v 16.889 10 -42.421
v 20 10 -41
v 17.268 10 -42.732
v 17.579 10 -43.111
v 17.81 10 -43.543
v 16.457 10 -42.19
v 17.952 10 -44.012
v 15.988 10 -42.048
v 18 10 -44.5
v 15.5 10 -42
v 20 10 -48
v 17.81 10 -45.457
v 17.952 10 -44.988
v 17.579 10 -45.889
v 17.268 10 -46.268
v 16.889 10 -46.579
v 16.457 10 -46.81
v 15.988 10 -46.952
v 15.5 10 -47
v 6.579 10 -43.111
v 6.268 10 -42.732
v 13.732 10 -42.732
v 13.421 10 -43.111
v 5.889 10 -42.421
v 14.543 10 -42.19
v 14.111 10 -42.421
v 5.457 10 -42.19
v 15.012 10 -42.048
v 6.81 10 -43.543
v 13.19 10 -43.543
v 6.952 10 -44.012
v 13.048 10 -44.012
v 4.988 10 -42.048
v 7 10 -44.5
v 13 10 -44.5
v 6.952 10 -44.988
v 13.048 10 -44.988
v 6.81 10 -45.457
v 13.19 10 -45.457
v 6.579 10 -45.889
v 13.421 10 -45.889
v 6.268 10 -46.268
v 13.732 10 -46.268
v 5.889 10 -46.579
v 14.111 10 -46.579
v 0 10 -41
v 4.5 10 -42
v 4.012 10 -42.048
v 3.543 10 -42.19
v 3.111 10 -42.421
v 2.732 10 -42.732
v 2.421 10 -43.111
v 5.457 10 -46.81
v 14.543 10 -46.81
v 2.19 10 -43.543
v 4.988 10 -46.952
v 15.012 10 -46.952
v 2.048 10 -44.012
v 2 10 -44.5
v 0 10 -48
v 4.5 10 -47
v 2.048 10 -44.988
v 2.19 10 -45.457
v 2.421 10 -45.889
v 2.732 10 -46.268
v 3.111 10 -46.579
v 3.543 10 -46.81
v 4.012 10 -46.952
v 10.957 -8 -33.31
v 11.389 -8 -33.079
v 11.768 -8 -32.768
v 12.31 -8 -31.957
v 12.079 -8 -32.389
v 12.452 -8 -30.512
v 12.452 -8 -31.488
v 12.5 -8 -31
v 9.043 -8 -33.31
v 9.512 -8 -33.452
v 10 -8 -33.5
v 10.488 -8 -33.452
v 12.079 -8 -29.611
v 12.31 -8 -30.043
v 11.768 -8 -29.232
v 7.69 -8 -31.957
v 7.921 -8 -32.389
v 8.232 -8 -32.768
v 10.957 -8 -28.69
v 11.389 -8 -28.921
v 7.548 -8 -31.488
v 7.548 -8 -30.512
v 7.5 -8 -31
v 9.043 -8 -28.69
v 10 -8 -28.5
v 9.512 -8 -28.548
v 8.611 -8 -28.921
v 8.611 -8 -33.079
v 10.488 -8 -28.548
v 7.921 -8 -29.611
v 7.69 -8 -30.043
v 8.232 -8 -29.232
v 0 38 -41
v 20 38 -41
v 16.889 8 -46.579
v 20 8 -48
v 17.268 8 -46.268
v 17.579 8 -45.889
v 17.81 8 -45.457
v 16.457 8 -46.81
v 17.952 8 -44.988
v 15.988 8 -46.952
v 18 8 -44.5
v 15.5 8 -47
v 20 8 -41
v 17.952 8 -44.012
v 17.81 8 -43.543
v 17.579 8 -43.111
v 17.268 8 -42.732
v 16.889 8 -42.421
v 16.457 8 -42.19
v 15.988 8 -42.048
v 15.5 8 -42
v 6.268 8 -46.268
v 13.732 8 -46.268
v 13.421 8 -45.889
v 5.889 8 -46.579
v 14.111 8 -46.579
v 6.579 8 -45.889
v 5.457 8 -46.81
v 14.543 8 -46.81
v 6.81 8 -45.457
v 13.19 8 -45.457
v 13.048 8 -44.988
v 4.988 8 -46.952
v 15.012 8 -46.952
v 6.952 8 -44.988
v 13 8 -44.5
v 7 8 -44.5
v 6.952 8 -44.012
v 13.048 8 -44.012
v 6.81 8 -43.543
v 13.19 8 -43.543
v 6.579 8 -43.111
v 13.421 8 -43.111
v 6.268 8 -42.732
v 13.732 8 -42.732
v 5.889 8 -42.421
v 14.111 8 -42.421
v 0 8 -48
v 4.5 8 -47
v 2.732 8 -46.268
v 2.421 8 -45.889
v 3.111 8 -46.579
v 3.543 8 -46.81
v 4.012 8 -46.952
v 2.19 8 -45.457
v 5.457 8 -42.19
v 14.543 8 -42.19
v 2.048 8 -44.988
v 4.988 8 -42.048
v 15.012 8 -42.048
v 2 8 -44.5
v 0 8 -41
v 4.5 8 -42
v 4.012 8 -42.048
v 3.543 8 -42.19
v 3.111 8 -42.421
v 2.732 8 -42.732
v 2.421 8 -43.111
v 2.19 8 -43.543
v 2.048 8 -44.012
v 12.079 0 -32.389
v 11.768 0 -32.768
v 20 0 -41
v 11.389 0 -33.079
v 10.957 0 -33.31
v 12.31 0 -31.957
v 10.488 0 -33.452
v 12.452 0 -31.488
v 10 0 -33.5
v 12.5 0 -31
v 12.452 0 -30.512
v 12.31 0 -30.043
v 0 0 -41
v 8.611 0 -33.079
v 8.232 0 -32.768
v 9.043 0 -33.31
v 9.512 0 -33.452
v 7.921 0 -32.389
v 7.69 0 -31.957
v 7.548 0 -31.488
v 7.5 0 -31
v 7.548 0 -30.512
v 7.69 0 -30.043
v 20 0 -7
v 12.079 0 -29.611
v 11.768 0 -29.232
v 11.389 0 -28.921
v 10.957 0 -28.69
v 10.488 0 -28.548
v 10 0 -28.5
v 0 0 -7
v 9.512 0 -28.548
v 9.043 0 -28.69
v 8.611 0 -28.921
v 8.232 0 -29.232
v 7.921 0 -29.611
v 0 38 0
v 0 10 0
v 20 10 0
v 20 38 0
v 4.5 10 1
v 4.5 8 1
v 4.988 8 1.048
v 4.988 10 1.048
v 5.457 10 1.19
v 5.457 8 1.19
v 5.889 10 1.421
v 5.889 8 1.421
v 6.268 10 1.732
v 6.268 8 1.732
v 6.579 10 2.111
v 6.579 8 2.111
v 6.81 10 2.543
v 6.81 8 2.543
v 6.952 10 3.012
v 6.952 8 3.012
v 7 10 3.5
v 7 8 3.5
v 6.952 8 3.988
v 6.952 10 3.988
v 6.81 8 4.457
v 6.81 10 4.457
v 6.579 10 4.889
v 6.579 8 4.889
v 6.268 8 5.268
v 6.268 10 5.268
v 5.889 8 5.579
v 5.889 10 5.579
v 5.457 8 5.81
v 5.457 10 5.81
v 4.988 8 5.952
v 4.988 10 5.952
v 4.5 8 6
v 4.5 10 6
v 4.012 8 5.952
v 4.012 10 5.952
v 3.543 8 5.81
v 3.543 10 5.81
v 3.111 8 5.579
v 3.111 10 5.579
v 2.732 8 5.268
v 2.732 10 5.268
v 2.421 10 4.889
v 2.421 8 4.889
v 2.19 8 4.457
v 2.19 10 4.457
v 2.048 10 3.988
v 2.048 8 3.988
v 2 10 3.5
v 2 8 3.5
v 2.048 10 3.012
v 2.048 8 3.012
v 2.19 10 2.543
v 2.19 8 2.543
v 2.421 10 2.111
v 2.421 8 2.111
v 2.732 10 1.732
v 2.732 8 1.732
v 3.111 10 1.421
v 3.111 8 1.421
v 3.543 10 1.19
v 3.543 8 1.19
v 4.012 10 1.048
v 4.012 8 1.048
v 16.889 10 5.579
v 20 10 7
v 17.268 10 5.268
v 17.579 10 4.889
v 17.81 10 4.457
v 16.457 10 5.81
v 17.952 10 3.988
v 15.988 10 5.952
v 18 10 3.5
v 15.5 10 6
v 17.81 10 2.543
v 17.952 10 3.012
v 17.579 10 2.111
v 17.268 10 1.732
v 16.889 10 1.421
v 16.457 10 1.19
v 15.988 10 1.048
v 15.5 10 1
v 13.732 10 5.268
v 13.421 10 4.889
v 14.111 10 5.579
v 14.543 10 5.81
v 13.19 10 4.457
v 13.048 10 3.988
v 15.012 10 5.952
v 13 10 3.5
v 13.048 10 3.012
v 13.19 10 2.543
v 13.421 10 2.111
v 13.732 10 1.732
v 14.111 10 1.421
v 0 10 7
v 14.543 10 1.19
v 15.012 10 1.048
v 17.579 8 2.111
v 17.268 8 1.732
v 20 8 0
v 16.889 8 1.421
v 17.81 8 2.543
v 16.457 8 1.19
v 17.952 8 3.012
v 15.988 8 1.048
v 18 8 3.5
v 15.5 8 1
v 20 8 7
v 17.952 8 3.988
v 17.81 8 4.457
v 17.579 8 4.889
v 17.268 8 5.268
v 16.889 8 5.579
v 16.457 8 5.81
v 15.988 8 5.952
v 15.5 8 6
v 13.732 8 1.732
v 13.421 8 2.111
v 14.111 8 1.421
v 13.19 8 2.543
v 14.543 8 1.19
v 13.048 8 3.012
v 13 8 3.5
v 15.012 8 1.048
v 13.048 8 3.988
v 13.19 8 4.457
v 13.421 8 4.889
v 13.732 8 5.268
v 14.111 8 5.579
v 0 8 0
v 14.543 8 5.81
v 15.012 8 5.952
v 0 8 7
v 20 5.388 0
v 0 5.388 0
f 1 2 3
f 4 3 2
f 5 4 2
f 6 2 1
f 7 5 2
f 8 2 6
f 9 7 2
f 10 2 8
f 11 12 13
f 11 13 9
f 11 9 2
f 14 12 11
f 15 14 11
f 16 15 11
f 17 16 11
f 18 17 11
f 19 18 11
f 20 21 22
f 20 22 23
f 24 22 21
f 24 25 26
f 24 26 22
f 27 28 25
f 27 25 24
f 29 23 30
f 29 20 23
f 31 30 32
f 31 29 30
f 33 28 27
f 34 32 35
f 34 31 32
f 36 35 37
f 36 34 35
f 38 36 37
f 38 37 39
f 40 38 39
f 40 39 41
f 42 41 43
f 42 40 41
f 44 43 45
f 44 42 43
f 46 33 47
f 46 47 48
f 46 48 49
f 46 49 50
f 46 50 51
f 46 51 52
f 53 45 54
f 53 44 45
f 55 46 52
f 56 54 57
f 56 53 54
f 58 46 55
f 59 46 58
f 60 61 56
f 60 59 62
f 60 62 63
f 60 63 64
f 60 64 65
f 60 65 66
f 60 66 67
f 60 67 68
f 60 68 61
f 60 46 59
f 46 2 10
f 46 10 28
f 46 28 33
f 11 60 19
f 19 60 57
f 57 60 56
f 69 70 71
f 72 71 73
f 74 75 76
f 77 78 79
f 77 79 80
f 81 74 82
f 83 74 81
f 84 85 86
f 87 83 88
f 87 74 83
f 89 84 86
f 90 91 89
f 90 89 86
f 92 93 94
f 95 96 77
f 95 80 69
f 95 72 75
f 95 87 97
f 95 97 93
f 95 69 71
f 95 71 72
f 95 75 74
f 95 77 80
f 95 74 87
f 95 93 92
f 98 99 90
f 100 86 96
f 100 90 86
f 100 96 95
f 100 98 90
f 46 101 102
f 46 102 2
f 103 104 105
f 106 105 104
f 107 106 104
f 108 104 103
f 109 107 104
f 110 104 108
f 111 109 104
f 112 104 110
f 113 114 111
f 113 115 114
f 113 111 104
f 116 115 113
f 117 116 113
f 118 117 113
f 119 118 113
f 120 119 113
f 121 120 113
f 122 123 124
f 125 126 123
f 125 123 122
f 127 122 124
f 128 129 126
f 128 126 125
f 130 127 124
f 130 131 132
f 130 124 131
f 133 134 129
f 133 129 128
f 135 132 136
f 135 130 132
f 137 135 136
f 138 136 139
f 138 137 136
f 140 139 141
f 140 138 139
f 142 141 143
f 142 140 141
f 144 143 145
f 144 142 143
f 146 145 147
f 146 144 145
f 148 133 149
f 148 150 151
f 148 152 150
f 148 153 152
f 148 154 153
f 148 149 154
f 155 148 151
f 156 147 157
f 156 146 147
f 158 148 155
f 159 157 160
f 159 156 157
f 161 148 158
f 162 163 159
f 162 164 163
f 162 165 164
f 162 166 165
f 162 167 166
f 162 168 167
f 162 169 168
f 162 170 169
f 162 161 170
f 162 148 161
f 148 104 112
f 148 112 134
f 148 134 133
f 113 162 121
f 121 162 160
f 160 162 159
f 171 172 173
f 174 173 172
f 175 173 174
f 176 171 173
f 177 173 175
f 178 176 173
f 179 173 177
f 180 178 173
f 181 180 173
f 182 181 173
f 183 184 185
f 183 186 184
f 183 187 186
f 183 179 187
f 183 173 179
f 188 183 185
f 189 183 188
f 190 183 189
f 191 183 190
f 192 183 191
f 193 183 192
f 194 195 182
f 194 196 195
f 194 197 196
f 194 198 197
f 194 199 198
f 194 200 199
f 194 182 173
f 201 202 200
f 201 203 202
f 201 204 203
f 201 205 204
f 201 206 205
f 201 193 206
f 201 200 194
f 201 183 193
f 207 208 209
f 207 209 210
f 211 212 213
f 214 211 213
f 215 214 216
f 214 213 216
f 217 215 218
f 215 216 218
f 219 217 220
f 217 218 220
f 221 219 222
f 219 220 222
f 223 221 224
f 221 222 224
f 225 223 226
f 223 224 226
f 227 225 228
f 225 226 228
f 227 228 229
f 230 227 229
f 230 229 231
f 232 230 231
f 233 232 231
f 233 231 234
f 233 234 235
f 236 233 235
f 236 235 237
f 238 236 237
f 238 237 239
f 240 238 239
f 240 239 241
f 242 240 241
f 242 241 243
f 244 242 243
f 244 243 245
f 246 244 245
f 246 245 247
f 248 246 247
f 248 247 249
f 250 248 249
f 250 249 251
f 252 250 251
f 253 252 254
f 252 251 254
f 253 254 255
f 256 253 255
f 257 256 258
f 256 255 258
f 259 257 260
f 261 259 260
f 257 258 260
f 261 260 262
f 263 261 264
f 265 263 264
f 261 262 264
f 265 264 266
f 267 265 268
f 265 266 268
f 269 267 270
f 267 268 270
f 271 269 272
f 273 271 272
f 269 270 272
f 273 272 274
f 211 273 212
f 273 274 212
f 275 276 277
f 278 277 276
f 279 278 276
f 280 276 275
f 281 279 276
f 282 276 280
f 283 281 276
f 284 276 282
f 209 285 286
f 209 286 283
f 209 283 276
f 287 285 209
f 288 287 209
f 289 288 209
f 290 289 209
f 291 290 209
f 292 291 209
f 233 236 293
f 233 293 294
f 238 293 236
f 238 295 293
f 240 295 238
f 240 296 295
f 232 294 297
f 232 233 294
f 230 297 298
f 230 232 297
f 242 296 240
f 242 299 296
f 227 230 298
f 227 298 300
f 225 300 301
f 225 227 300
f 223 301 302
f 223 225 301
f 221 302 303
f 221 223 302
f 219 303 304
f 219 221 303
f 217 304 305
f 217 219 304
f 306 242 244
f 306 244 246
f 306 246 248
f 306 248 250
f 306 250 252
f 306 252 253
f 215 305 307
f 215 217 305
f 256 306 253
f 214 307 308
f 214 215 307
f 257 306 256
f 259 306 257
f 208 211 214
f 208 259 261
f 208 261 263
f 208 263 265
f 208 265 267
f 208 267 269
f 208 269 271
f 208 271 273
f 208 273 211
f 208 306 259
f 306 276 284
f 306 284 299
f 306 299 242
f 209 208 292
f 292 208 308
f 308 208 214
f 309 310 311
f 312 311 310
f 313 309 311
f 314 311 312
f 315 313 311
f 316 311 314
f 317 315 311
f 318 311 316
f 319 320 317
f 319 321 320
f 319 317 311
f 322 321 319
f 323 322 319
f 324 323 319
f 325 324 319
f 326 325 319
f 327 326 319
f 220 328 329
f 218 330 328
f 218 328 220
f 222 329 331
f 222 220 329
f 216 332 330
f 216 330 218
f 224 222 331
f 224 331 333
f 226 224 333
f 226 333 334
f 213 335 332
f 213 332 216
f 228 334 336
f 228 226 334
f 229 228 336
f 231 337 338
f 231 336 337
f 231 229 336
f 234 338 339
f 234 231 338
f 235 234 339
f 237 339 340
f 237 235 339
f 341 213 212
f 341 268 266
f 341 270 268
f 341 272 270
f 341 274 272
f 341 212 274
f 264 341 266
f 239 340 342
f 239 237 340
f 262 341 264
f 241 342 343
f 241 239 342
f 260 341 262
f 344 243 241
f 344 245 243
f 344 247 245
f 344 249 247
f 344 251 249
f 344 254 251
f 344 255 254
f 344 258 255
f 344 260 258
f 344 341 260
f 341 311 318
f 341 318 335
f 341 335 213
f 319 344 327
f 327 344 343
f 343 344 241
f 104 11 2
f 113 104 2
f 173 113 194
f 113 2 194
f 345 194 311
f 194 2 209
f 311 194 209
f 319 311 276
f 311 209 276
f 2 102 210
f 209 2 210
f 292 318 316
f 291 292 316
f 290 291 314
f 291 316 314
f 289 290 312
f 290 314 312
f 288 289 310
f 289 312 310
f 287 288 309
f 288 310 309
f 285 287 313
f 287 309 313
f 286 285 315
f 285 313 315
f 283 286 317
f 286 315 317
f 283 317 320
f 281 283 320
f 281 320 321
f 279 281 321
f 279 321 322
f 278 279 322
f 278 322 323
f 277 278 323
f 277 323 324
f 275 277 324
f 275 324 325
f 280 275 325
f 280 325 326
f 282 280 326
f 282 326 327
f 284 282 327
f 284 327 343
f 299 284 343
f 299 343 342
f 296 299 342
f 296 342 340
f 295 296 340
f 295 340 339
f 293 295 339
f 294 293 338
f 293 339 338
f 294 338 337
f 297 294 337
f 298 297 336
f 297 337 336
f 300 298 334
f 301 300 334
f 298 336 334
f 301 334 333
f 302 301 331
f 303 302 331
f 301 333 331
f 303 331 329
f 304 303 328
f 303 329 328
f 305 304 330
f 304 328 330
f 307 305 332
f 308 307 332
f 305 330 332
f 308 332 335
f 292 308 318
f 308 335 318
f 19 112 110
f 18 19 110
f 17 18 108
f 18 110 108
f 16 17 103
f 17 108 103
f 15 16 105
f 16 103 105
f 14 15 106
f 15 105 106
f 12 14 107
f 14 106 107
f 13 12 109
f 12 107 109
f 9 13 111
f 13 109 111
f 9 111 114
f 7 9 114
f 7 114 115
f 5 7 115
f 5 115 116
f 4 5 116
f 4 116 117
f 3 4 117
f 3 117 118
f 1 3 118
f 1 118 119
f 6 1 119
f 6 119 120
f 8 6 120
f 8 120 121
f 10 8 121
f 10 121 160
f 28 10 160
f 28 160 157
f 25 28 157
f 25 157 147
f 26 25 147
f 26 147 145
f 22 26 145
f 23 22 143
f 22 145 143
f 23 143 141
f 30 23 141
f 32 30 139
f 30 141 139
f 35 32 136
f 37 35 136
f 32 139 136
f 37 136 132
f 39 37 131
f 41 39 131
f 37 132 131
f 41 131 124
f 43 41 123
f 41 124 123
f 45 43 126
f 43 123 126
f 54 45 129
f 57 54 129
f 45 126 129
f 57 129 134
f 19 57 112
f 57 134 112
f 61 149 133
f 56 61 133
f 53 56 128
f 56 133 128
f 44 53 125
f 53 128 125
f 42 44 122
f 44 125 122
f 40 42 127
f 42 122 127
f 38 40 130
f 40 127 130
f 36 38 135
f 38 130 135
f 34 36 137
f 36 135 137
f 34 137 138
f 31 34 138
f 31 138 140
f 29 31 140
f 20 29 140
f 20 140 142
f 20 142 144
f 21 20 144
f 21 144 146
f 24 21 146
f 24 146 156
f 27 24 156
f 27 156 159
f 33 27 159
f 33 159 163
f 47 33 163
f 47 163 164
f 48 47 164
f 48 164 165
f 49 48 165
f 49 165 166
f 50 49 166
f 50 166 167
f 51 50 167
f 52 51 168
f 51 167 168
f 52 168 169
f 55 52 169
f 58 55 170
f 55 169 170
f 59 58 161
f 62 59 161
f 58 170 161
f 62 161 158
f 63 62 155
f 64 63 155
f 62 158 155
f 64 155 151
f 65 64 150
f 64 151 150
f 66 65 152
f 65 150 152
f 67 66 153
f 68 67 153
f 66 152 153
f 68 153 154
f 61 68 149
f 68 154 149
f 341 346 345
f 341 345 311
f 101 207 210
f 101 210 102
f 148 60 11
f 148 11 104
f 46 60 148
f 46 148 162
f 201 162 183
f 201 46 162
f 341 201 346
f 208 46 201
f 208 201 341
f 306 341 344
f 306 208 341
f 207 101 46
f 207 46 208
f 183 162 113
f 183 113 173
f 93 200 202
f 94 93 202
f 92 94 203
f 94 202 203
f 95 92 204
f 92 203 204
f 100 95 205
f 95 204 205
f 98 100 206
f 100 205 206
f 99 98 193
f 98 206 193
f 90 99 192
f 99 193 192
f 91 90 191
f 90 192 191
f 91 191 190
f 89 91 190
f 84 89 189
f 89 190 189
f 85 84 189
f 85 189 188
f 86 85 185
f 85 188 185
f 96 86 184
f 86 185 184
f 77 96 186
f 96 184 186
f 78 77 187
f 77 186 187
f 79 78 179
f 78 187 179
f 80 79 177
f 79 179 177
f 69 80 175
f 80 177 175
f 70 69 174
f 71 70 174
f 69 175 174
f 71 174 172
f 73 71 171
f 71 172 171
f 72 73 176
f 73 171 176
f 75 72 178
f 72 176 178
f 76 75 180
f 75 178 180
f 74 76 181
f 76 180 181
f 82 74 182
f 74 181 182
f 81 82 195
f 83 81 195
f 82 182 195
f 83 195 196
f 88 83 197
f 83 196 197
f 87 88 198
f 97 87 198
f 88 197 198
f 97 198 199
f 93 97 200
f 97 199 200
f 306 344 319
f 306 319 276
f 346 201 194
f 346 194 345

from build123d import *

# Parameters (mm, degrees)
SALIENTE_EXTRUIR1_DEPTH = 20
CROQUIS2_R              = 2.5
SALIENTE_EXTRUIR2_DEPTH = 8
CROQUIS3_R              = 2.5
CORTAR_EXTRUIR1_DEPTH   = 10


with BuildPart() as part:
    # Croquis1 → Saliente-Extruir1 (new body)
    with BuildSketch(Plane(origin=(0, 0, 0), x_dir=(0, 0, -1), z_dir=(1, 0, 0))):
        Polygon((41, 10), (48, 10), (48, 8), (41, 8), (41, 0), (7, 0), (0, 5.387789056), (0, 8), (-7, 8), (-7, 10), (0, 10), (0, 38), (41, 38), align=None)
    extrude(amount=SALIENTE_EXTRUIR1_DEPTH)

    # Croquis2 → Saliente-Extruir2 (add)
    with BuildSketch(Plane.XZ):
        with Locations(Location((10, -31, 0), (0, 0, 90))):
            Circle(CROQUIS2_R)
    extrude(amount=SALIENTE_EXTRUIR2_DEPTH)

    # Croquis3 → Cortar-Extruir1 (cut)
    with BuildSketch(Plane.XZ.offset(-8)):
        with Locations(Location((4.5, 3.5, 0), (0, 0, 270))):
            Circle(CROQUIS3_R)
        with Locations(Location((15.5, 3.5, 0), (0, 0, 270))):
            Circle(CROQUIS3_R)
        with Locations(Location((15.5, -44.5, 0), (0, 0, 270))):
            Circle(CROQUIS3_R)
        with Locations(Location((4.5, -44.5, 0), (0, 0, 270))):
            Circle(CROQUIS3_R)
    extrude(amount=-CORTAR_EXTRUIR1_DEPTH, mode=Mode.SUBTRACT)


solid = part.part
